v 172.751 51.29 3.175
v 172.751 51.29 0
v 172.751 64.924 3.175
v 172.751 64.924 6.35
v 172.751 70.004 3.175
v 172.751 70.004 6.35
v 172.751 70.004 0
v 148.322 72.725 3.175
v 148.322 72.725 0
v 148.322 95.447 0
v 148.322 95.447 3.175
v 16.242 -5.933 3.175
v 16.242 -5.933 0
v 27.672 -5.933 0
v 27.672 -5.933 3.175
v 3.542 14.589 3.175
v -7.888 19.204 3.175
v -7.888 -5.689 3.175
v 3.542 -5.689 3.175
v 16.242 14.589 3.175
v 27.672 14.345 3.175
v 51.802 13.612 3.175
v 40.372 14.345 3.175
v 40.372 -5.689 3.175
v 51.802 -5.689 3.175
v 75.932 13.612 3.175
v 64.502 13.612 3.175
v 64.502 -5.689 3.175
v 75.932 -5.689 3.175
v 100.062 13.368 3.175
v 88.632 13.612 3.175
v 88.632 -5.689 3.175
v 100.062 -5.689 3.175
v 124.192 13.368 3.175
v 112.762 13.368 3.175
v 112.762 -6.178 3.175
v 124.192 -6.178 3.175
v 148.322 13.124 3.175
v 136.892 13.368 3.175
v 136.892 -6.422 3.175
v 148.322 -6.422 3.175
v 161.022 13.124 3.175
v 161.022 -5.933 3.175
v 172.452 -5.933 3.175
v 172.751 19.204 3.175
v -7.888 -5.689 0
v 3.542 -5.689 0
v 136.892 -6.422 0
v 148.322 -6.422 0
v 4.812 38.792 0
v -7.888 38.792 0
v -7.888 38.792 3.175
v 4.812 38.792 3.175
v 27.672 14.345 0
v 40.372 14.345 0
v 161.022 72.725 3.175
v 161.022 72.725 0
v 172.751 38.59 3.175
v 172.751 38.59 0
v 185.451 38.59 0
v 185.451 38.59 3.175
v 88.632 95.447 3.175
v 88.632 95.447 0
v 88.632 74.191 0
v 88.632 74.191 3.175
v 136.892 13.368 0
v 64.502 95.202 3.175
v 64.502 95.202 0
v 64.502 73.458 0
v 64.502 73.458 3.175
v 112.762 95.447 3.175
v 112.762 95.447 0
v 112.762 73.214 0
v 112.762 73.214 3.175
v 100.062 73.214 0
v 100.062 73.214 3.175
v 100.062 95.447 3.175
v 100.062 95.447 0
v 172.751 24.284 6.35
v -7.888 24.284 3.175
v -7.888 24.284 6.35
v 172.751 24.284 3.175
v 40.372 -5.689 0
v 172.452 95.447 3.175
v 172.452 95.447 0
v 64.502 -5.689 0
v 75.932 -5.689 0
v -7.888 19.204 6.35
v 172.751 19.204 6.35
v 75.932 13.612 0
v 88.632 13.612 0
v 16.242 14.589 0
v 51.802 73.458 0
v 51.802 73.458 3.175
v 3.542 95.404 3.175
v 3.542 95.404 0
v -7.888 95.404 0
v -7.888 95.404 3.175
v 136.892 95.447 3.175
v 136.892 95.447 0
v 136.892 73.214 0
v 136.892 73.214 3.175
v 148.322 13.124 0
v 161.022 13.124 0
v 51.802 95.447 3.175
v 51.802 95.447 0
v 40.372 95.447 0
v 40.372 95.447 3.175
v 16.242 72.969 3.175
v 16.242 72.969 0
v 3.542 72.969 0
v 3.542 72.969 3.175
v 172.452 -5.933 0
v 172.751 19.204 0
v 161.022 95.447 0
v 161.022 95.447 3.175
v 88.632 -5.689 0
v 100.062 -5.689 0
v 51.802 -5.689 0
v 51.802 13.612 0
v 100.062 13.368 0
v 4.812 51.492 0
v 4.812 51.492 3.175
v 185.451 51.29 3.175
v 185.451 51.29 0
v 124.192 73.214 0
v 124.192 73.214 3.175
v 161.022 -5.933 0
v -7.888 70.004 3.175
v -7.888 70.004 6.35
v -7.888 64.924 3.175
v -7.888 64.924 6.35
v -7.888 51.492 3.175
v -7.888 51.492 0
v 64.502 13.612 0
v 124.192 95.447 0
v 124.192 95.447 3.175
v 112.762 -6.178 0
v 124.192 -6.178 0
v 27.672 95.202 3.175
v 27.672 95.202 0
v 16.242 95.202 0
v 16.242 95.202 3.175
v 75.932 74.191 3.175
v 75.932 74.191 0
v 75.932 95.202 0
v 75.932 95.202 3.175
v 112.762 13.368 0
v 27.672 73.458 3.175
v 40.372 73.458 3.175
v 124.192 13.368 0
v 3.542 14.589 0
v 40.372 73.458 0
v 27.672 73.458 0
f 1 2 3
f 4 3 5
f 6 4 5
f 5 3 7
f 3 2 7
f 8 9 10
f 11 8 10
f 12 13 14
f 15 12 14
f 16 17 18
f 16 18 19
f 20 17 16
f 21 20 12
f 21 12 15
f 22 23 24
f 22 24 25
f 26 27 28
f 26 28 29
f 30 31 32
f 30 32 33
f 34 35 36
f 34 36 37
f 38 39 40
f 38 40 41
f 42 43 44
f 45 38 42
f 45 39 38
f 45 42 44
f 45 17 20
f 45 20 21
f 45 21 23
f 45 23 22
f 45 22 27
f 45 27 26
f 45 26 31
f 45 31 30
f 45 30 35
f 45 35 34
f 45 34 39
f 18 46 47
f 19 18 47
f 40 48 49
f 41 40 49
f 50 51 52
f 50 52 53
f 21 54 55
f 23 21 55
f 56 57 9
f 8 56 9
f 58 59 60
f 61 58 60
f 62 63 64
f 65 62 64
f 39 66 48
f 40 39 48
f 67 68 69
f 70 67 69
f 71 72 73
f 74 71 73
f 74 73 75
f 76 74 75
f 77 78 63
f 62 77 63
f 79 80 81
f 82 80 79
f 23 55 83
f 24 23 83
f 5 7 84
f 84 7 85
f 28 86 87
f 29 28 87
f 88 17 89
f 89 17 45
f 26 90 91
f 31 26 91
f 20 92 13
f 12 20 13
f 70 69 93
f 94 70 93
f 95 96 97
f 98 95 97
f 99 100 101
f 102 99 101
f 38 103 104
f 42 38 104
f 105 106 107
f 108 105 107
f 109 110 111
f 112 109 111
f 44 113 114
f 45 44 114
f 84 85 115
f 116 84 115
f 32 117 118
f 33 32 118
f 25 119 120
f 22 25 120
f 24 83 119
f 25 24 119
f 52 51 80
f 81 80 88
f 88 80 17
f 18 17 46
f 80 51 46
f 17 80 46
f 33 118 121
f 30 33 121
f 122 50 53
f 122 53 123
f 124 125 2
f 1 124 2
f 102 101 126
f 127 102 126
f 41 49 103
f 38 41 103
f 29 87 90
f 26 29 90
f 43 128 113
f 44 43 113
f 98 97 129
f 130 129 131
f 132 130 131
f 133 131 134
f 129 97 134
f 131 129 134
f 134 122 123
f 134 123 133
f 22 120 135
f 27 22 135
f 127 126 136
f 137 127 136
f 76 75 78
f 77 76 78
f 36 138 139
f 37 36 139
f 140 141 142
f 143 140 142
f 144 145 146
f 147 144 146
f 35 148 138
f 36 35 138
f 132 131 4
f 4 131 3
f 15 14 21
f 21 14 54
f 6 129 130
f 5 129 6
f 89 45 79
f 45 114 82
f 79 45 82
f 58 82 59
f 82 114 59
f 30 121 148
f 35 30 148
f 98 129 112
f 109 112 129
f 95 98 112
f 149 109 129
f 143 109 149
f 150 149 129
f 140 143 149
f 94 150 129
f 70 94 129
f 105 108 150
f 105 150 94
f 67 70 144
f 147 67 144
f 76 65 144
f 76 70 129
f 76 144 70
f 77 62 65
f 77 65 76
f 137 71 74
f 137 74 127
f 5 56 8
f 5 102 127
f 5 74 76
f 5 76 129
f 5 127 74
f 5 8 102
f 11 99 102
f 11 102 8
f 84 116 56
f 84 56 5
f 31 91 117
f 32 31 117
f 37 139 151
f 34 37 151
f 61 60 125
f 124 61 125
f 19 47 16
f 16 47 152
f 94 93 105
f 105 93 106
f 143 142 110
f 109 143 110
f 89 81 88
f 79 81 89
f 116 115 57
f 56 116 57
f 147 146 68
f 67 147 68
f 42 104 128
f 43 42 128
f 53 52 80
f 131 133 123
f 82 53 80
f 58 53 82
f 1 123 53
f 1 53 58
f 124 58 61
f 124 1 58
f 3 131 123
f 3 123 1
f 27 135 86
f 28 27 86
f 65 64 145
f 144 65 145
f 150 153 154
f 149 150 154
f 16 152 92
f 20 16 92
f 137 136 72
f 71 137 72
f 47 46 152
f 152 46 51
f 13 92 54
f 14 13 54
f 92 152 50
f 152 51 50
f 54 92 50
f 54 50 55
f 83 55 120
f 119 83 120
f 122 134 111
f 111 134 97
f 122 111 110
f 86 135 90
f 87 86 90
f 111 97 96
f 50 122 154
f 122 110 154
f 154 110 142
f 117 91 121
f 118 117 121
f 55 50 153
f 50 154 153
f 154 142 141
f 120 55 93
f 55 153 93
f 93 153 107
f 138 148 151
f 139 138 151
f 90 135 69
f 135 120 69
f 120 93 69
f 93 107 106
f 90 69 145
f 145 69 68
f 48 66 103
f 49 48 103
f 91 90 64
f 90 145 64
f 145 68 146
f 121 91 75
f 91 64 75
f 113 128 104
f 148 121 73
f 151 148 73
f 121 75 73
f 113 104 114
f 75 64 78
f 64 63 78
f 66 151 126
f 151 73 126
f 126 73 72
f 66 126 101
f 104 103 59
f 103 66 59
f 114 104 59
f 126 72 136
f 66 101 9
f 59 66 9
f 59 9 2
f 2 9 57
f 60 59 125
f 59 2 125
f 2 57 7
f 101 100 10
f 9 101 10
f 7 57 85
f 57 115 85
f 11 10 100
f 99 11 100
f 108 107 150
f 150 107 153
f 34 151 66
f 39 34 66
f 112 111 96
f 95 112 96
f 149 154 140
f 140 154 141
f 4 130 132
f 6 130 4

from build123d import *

# Parameters (mm, degrees)
F1_DEPTH = 3.175
F0_W     = 180.639096
F0_H     = 5.08
F2_DEPTH = 6.35
F3_DEPTH = 3.175
F4_DEPTH = 3.175
F5_DEPTH = 20.32


with BuildPart() as f1:
    # F0 (on Top) → F1 (new body)
    with BuildSketch(Plane.XY):
        Polygon((185.450711, 51.289835), (172.750711, 51.289835), (172.750711, 38.589835), (185.450711, 38.589835), (185.450711, 45.141608), align=None)
        Polygon((172.750711, 64.923577), (-7.888385, 64.923577), (-7.888385, 51.491608), (4.811615, 51.491608), (4.811615, 45.141608), (4.811615, 38.791608), (-7.888385, 38.791608), (-7.888385, 24.283577), (172.750711, 24.283577), (172.750711, 38.589835), (172.750711, 51.289835), align=None)
    extrude(amount=F1_DEPTH)

    # F0 (on Top) → F2 (join)
    with BuildSketch(Plane.XY):
        with Locations((82.431163, 21.743577)):
            Rectangle(F0_W, F0_H)
        with Locations((82.431163, 67.463577)):
            Rectangle(F0_W, F0_H)
    extrude(amount=F2_DEPTH)

    # F0 (on Top) → F3 (join)
    with BuildSketch(Plane.XY):
        Polygon((-7.888385, 95.403577), (-7.888385, 70.003577), (172.750711, 70.003577), (172.451615, 95.446534), (161.021615, 95.446534), (161.021615, 72.725058), (148.321615, 72.725058), (148.321615, 95.446534), (136.891615, 95.446534), (136.891615, 73.213689), (124.191615, 73.213689), (124.191615, 95.446534), (112.761615, 95.446534), (112.761615, 73.213689), (100.061615, 73.213689), (100.061615, 95.446534), (88.631615, 95.446534), (88.631615, 74.190959), (75.931615, 74.190959), (75.931615, 95.202222), (64.501615, 95.202222), (64.501615, 73.458008), (51.801615, 73.458008), (51.801615, 95.446534), (40.371615, 95.446534), (40.371615, 73.458008), (27.671615, 73.458008), (27.671615, 95.202215), (16.241615, 95.202215), (16.241615, 72.96937), (3.541615, 72.96937), (3.541615, 95.403577), align=None)
        Polygon((172.750711, 19.203577), (-7.888385, 19.203577), (-7.888385, -5.6889), (3.541615, -5.6889), (3.541615, 14.589407), (16.241615, 14.589407), (16.241615, -5.933219), (27.671615, -5.933219), (27.671615, 14.345091), (40.371615, 14.345091), (40.371615, -5.6889), (51.801615, -5.6889), (51.801615, 13.612141), (64.501615, 13.612141), (64.501615, -5.6889), (75.931615, -5.6889), (75.931615, 13.612141), (88.631615, 13.612141), (88.631615, -5.6889), (100.061615, -5.6889), (100.061615, 13.367824), (112.761615, 13.367824), (112.761615, -6.177533), (124.191615, -6.177533), (124.191615, 13.367824), (136.891615, 13.367824), (136.891615, -6.421852), (148.321615, -6.421852), (148.321615, 13.123516), (161.021615, 13.123516), (161.021615, -5.933208), (172.451615, -5.933208), align=None)
    extrude(amount=F3_DEPTH)

    # F0 (on Top) → F4 (join)
    with BuildSketch(Plane.XY):
        Polygon((-7.888385, 95.403577), (-7.888385, 70.003577), (172.750711, 70.003577), (172.451615, 95.446534), (161.021615, 95.446534), (161.021615, 72.725058), (148.321615, 72.725058), (148.321615, 95.446534), (136.891615, 95.446534), (136.891615, 73.213689), (124.191615, 73.213689), (124.191615, 95.446534), (112.761615, 95.446534), (112.761615, 73.213689), (100.061615, 73.213689), (100.061615, 95.446534), (88.631615, 95.446534), (88.631615, 74.190959), (75.931615, 74.190959), (75.931615, 95.202222), (64.501615, 95.202222), (64.501615, 73.458008), (51.801615, 73.458008), (51.801615, 95.446534), (40.371615, 95.446534), (40.371615, 73.458008), (27.671615, 73.458008), (27.671615, 95.202215), (16.241615, 95.202215), (16.241615, 72.96937), (3.541615, 72.96937), (3.541615, 95.403577), align=None)
        with Locations((82.431163, 67.463577)):
            Rectangle(F0_W, F0_H)
        Polygon((172.750711, 64.923577), (-7.888385, 64.923577), (-7.888385, 51.491608), (4.811615, 51.491608), (4.811615, 45.141608), (4.811615, 38.791608), (-7.888385, 38.791608), (-7.888385, 24.283577), (172.750711, 24.283577), (172.750711, 38.589835), (172.750711, 51.289835), align=None)
        Polygon((4.811615, 51.491608), (-7.888385, 51.491608), (-7.888385, 38.791608), (4.811615, 38.791608), (4.811615, 45.141608), align=None)
        Polygon((185.450711, 51.289835), (172.750711, 51.289835), (172.750711, 38.589835), (185.450711, 38.589835), (185.450711, 45.141608), align=None)
        with Locations((82.431163, 21.743577)):
            Rectangle(F0_W, F0_H)
        Polygon((172.750711, 19.203577), (-7.888385, 19.203577), (-7.888385, -5.6889), (3.541615, -5.6889), (3.541615, 14.589407), (16.241615, 14.589407), (16.241615, -5.933219), (27.671615, -5.933219), (27.671615, 14.345091), (40.371615, 14.345091), (40.371615, -5.6889), (51.801615, -5.6889), (51.801615, 13.612141), (64.501615, 13.612141), (64.501615, -5.6889), (75.931615, -5.6889), (75.931615, 13.612141), (88.631615, 13.612141), (88.631615, -5.6889), (100.061615, -5.6889), (100.061615, 13.367824), (112.761615, 13.367824), (112.761615, -6.177533), (124.191615, -6.177533), (124.191615, 13.367824), (136.891615, 13.367824), (136.891615, -6.421852), (148.321615, -6.421852), (148.321615, 13.123516), (161.021615, 13.123516), (161.021615, -5.933208), (172.451615, -5.933208), align=None)
    extrude(amount=F4_DEPTH)

    # F0 (on Top) → F5 (cut)
    with BuildSketch(Plane.XY):
        Polygon((4.811615, 51.491608), (-7.888385, 51.491608), (-7.888385, 38.791608), (4.811615, 38.791608), (4.811615, 45.141608), align=None)
    extrude(amount=F5_DEPTH, mode=Mode.SUBTRACT)


solid = f1.part
